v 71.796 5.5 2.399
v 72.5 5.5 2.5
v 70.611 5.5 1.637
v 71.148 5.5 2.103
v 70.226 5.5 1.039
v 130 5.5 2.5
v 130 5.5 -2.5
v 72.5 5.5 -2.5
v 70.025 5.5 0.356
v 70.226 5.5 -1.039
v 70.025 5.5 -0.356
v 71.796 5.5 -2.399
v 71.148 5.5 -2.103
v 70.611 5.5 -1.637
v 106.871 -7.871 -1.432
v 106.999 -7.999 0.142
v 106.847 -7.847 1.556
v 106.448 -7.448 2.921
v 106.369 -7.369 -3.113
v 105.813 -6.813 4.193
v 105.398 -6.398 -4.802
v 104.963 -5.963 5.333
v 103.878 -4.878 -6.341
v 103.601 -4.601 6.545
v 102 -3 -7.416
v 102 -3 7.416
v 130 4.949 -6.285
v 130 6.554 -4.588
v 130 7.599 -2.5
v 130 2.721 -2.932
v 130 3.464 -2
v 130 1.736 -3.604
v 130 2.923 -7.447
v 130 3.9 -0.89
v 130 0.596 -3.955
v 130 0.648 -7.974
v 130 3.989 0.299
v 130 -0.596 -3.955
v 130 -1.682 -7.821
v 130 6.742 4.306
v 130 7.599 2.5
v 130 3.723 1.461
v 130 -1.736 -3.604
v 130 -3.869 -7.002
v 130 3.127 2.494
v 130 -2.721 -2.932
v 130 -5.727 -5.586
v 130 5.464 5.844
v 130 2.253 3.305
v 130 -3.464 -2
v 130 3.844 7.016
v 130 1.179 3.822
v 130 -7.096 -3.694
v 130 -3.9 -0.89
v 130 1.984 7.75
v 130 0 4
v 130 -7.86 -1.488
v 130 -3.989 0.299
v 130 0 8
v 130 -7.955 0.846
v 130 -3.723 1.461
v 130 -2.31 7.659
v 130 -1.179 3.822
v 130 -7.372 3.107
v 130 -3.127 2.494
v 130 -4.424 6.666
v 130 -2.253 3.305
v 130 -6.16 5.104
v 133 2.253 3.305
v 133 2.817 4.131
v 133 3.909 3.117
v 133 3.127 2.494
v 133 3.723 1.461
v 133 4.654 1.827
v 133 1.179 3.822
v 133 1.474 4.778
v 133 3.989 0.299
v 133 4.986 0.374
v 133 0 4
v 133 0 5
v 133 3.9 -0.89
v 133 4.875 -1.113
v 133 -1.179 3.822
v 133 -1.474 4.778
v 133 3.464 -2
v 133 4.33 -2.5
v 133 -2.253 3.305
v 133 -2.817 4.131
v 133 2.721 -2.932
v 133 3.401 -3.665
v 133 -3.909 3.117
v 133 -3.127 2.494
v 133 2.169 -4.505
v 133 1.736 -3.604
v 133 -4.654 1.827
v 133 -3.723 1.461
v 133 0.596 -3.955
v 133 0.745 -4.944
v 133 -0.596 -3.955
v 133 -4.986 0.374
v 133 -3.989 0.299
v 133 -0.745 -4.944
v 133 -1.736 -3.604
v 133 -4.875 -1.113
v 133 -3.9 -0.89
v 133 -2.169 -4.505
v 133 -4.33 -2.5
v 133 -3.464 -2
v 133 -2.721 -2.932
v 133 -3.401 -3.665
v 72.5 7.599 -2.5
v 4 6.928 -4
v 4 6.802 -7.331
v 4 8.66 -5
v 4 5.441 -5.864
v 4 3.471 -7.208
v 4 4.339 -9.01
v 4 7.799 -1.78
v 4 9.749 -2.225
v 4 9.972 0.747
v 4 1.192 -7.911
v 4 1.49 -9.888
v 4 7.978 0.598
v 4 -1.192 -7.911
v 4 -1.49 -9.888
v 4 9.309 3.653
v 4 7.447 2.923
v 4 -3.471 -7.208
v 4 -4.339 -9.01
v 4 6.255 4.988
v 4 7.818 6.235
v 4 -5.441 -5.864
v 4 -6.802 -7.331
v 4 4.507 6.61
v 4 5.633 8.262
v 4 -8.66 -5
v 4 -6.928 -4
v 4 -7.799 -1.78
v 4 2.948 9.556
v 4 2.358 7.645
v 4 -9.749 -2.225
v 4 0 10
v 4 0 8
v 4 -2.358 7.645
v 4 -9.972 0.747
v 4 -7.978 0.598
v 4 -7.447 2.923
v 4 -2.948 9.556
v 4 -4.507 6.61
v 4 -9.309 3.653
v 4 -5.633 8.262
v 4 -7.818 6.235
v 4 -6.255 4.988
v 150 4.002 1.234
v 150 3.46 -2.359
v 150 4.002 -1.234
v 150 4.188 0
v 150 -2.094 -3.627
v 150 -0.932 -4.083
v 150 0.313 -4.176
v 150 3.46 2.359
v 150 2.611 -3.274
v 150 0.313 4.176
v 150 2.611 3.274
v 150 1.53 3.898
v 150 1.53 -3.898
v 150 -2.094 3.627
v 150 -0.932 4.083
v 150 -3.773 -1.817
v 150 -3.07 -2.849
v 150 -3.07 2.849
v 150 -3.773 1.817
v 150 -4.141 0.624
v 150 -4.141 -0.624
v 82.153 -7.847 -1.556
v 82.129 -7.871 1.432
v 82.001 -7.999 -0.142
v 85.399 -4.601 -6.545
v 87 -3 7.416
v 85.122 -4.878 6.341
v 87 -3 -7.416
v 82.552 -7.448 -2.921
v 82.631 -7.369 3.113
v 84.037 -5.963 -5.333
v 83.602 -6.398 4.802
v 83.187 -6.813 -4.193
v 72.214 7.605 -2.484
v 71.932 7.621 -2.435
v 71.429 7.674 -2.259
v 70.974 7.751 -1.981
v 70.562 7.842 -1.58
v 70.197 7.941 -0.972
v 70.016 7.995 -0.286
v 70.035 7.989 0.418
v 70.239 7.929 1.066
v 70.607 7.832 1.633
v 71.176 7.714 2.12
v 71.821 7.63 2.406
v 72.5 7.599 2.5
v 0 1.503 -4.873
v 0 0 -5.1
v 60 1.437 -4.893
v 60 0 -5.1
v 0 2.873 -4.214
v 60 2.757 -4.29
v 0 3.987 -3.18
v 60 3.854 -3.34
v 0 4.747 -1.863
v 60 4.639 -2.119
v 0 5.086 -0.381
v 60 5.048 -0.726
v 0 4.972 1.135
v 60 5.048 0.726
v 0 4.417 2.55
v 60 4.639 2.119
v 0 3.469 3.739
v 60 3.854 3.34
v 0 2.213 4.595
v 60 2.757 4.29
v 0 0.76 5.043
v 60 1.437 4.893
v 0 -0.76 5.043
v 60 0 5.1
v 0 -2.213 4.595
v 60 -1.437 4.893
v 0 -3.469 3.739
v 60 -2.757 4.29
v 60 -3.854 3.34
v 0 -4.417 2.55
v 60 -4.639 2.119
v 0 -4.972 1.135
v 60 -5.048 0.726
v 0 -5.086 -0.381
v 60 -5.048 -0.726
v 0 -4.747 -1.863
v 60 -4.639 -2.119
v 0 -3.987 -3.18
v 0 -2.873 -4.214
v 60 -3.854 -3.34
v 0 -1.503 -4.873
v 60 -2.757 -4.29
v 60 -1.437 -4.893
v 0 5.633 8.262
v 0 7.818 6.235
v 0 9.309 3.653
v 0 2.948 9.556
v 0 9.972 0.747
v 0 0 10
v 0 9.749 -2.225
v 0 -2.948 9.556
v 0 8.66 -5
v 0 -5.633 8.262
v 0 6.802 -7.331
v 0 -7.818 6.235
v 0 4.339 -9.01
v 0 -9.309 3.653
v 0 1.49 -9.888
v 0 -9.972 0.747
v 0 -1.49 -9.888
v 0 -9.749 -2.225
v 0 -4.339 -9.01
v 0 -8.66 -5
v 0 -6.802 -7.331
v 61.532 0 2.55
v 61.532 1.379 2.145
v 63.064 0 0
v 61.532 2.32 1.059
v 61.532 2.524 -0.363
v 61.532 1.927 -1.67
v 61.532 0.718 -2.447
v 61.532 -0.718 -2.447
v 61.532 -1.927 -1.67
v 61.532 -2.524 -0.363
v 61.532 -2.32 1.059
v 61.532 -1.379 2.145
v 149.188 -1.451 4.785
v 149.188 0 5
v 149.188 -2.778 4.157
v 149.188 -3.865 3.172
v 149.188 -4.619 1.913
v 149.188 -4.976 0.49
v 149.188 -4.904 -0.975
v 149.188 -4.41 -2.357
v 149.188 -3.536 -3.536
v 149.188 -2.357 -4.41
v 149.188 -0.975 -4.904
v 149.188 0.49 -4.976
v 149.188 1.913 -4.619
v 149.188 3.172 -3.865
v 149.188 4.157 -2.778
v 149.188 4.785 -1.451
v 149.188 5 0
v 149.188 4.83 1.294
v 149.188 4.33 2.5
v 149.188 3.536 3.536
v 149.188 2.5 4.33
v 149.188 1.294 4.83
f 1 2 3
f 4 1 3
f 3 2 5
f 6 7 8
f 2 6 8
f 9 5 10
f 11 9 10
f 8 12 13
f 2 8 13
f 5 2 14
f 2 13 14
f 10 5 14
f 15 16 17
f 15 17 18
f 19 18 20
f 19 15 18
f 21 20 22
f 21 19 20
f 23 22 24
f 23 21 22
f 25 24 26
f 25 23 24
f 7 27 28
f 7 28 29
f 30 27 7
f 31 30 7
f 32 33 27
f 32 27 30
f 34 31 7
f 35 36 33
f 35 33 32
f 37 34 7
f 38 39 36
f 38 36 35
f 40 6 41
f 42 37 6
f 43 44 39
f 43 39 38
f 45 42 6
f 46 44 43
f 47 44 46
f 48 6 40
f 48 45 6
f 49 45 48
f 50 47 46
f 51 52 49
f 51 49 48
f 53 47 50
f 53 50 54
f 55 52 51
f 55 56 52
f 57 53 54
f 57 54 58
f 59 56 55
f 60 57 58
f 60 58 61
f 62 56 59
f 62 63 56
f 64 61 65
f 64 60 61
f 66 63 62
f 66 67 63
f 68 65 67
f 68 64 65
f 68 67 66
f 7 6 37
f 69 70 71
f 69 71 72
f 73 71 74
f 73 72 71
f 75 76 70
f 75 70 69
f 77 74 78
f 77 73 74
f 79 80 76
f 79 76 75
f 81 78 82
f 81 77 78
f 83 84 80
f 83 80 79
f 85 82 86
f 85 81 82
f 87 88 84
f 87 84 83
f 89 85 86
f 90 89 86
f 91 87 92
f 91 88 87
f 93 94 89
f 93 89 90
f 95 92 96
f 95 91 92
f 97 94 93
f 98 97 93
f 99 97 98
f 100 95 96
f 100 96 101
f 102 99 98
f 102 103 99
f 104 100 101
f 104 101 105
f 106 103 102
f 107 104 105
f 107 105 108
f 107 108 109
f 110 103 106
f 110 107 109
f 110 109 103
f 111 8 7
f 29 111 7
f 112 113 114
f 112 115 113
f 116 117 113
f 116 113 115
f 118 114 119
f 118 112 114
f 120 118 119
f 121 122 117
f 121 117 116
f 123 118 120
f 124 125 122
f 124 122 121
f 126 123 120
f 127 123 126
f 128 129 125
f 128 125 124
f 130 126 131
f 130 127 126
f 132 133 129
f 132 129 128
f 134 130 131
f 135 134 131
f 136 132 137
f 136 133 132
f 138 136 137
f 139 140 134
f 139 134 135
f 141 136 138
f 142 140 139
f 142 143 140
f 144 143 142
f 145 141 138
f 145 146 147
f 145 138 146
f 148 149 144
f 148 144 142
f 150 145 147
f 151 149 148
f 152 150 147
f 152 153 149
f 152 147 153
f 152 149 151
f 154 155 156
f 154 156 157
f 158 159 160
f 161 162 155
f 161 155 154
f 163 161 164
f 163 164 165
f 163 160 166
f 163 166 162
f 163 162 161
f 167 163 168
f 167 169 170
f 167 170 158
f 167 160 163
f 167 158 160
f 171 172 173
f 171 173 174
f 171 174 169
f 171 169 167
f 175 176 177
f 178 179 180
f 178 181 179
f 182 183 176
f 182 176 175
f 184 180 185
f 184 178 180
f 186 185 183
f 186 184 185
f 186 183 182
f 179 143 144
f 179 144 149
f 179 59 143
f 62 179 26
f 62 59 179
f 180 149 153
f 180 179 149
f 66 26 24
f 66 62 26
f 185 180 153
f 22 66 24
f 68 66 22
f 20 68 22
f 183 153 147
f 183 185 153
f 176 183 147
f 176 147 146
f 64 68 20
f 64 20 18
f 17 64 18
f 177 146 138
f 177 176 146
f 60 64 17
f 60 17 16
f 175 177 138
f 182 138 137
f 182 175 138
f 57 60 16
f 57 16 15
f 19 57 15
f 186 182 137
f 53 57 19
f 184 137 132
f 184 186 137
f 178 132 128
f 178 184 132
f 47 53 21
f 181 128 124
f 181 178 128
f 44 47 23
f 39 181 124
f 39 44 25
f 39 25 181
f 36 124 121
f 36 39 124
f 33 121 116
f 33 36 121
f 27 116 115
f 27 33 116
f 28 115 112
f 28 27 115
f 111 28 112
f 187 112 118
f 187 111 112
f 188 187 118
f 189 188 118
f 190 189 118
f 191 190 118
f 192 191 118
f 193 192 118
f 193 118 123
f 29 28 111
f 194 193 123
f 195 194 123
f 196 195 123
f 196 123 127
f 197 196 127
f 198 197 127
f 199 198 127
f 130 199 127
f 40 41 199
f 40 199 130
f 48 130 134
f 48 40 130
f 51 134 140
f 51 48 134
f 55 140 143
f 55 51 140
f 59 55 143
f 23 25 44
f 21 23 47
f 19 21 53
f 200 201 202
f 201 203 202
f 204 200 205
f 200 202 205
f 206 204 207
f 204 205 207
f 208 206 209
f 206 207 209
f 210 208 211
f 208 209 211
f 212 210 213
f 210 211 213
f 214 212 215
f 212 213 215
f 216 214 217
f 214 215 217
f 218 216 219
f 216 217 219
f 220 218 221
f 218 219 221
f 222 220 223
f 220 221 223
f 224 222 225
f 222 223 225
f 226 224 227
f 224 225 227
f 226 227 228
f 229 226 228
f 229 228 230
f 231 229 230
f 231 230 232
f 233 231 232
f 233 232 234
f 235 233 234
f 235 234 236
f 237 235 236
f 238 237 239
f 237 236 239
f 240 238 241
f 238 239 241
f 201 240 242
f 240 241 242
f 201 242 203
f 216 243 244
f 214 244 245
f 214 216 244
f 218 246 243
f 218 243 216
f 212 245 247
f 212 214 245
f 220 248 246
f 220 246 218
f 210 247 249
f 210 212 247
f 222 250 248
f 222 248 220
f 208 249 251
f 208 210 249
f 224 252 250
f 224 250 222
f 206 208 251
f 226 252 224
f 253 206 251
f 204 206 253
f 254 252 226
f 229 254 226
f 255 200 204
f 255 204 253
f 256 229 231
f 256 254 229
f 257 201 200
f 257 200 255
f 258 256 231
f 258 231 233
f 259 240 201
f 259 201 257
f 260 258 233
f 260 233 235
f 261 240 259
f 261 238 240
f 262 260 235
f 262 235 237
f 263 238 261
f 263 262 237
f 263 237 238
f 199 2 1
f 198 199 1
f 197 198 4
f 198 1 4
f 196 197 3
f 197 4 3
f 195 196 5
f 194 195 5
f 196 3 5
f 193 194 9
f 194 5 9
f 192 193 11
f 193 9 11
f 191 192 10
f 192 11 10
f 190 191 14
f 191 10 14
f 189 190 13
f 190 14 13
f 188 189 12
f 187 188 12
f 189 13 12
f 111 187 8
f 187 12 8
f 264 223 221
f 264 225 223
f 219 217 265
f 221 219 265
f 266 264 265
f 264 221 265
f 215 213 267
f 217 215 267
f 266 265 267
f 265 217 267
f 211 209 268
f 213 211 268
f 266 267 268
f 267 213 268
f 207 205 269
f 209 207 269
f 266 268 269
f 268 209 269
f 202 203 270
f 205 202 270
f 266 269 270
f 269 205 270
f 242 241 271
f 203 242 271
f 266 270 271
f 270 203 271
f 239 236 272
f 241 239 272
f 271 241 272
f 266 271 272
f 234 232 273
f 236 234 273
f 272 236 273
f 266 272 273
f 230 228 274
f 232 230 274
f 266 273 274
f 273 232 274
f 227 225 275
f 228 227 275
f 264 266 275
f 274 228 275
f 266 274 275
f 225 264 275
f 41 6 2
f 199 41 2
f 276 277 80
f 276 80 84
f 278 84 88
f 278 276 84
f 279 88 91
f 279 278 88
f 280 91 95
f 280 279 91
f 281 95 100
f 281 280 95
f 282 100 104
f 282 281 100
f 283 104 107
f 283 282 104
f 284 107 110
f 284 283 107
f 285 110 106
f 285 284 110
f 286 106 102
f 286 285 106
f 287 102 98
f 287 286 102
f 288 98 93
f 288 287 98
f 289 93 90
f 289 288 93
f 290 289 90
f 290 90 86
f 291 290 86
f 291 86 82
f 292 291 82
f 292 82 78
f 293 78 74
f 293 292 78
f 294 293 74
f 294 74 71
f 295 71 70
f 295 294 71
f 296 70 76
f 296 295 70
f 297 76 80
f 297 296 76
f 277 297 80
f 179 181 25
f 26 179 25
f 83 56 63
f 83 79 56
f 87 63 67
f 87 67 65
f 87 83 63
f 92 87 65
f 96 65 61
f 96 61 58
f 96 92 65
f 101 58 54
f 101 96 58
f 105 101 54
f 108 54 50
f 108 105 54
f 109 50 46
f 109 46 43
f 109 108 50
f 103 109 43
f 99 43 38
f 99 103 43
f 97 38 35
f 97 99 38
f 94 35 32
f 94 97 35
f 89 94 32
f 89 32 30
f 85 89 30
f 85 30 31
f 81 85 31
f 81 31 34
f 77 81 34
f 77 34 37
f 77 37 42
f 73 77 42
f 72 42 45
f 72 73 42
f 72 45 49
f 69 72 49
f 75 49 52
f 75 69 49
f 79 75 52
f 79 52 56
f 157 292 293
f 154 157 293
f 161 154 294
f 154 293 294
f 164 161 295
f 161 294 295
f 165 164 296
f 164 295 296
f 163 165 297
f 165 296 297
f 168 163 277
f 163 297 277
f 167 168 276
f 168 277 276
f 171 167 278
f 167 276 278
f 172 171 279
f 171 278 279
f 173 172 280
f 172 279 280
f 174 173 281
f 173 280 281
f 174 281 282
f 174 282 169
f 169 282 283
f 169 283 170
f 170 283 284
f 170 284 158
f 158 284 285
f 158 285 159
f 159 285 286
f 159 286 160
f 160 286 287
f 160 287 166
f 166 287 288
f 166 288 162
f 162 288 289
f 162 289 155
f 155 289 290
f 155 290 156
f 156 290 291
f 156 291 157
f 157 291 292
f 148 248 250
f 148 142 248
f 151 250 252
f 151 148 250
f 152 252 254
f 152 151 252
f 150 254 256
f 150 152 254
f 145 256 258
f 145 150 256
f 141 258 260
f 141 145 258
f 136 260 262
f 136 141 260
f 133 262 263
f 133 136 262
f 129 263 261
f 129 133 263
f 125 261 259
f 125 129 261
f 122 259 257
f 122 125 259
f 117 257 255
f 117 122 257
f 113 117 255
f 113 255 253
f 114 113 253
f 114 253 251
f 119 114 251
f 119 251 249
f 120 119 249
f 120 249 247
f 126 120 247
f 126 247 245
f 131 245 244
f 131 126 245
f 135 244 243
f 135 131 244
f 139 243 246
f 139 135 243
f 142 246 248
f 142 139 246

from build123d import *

# Parameters (mm, degrees)
CUT_EXTRUDE_START        = 5.5
CUT_EXTRUDE_1_DEPTH      = 146.165191733
HOLE_WIZARD_M12_1_D      = 10.2
HOLE_WIZARD_M12_1_DEPTH  = 60
HOLE_WIZARD_M12_1_TIP    = 3.064389157
CUT_EXTRUDE_2_DEPTH      = 151.665191733
CUT_EXTRUDE_2_DEPTH_BACK = 151.665191733


# Read off the part's stored shape, not the designer's step: M10 机械螺纹 螺柱1
with BuildPart() as part:
    # 草图1 → 旋转1 (revolve)
    with BuildSketch(Plane.XY, mode=Mode.PRIVATE) as revolve_1_sk:
        Polygon((0, 0), (0, 10), (4, 10), (4, 8), (130, 8), (130, 4), (133, 4), (133, 5), (150, 5), (150, 0), align=None)
    revolve(revolve_1_sk.sketch.rotate(Axis((0, 0, 0), (1, 0, 0)), 90), axis=Axis((0, 0, 0), (1, 0, 0)))

    # M10 机械螺纹 螺柱1 outline → M10 机械螺纹 螺柱1 (revolve, cut)
    with BuildSketch(Plane.YX):
        Polygon((5, 150), (4.188, 150), (5, 149.188), align=None)
    revolve(axis=Axis((0, 0, 0), (1, 0, 0)), mode=Mode.SUBTRACT)

    # 草图3 → 切除-拉伸1 (cut, through all)
    with BuildSketch(Plane(origin=(0, 0, 0), x_dir=(1, 0, 0), z_dir=(0, 1, 0)).offset(CUT_EXTRUDE_START)):
        with BuildLine():
            Line((130, -2.5), (72.5, -2.5))
            ThreePointArc((72.5, -2.5), (70, 0), (72.5, 2.5))
            Line((72.5, 2.5), (130, 2.5))
            ThreePointArc((130, 2.5), (132.5, 0), (130, -2.5))
        make_face()
    extrude(amount=CUT_EXTRUDE_1_DEPTH, mode=Mode.SUBTRACT)

    # M12 螺纹孔1
    with Locations(Plane.ZY):
        with Locations((0, 0)):
            Hole(HOLE_WIZARD_M12_1_D / 2, depth=HOLE_WIZARD_M12_1_DEPTH)
            with Locations((0, 0, -(HOLE_WIZARD_M12_1_DEPTH + HOLE_WIZARD_M12_1_TIP / 2))):  # 118° drill point
                Cone(0, HOLE_WIZARD_M12_1_D / 2, HOLE_WIZARD_M12_1_TIP, mode=Mode.SUBTRACT)

    # 草图6 → 切除-拉伸2 (cut, two sides: drawn at the far end of the back side and taken through both)
    with BuildSketch(Plane.XY.offset(-CUT_EXTRUDE_2_DEPTH_BACK)):
        Polygon((-78.518127086, -168.518127086), (82, -8), (87, -3), (102, -3), (107, -8), (267.518127086, -168.518127086), (267.518127086, -622.531951751), (-78.518127086, -622.531951751), align=None)
    extrude(amount=CUT_EXTRUDE_2_DEPTH + CUT_EXTRUDE_2_DEPTH_BACK, mode=Mode.SUBTRACT)


solid = part.part
